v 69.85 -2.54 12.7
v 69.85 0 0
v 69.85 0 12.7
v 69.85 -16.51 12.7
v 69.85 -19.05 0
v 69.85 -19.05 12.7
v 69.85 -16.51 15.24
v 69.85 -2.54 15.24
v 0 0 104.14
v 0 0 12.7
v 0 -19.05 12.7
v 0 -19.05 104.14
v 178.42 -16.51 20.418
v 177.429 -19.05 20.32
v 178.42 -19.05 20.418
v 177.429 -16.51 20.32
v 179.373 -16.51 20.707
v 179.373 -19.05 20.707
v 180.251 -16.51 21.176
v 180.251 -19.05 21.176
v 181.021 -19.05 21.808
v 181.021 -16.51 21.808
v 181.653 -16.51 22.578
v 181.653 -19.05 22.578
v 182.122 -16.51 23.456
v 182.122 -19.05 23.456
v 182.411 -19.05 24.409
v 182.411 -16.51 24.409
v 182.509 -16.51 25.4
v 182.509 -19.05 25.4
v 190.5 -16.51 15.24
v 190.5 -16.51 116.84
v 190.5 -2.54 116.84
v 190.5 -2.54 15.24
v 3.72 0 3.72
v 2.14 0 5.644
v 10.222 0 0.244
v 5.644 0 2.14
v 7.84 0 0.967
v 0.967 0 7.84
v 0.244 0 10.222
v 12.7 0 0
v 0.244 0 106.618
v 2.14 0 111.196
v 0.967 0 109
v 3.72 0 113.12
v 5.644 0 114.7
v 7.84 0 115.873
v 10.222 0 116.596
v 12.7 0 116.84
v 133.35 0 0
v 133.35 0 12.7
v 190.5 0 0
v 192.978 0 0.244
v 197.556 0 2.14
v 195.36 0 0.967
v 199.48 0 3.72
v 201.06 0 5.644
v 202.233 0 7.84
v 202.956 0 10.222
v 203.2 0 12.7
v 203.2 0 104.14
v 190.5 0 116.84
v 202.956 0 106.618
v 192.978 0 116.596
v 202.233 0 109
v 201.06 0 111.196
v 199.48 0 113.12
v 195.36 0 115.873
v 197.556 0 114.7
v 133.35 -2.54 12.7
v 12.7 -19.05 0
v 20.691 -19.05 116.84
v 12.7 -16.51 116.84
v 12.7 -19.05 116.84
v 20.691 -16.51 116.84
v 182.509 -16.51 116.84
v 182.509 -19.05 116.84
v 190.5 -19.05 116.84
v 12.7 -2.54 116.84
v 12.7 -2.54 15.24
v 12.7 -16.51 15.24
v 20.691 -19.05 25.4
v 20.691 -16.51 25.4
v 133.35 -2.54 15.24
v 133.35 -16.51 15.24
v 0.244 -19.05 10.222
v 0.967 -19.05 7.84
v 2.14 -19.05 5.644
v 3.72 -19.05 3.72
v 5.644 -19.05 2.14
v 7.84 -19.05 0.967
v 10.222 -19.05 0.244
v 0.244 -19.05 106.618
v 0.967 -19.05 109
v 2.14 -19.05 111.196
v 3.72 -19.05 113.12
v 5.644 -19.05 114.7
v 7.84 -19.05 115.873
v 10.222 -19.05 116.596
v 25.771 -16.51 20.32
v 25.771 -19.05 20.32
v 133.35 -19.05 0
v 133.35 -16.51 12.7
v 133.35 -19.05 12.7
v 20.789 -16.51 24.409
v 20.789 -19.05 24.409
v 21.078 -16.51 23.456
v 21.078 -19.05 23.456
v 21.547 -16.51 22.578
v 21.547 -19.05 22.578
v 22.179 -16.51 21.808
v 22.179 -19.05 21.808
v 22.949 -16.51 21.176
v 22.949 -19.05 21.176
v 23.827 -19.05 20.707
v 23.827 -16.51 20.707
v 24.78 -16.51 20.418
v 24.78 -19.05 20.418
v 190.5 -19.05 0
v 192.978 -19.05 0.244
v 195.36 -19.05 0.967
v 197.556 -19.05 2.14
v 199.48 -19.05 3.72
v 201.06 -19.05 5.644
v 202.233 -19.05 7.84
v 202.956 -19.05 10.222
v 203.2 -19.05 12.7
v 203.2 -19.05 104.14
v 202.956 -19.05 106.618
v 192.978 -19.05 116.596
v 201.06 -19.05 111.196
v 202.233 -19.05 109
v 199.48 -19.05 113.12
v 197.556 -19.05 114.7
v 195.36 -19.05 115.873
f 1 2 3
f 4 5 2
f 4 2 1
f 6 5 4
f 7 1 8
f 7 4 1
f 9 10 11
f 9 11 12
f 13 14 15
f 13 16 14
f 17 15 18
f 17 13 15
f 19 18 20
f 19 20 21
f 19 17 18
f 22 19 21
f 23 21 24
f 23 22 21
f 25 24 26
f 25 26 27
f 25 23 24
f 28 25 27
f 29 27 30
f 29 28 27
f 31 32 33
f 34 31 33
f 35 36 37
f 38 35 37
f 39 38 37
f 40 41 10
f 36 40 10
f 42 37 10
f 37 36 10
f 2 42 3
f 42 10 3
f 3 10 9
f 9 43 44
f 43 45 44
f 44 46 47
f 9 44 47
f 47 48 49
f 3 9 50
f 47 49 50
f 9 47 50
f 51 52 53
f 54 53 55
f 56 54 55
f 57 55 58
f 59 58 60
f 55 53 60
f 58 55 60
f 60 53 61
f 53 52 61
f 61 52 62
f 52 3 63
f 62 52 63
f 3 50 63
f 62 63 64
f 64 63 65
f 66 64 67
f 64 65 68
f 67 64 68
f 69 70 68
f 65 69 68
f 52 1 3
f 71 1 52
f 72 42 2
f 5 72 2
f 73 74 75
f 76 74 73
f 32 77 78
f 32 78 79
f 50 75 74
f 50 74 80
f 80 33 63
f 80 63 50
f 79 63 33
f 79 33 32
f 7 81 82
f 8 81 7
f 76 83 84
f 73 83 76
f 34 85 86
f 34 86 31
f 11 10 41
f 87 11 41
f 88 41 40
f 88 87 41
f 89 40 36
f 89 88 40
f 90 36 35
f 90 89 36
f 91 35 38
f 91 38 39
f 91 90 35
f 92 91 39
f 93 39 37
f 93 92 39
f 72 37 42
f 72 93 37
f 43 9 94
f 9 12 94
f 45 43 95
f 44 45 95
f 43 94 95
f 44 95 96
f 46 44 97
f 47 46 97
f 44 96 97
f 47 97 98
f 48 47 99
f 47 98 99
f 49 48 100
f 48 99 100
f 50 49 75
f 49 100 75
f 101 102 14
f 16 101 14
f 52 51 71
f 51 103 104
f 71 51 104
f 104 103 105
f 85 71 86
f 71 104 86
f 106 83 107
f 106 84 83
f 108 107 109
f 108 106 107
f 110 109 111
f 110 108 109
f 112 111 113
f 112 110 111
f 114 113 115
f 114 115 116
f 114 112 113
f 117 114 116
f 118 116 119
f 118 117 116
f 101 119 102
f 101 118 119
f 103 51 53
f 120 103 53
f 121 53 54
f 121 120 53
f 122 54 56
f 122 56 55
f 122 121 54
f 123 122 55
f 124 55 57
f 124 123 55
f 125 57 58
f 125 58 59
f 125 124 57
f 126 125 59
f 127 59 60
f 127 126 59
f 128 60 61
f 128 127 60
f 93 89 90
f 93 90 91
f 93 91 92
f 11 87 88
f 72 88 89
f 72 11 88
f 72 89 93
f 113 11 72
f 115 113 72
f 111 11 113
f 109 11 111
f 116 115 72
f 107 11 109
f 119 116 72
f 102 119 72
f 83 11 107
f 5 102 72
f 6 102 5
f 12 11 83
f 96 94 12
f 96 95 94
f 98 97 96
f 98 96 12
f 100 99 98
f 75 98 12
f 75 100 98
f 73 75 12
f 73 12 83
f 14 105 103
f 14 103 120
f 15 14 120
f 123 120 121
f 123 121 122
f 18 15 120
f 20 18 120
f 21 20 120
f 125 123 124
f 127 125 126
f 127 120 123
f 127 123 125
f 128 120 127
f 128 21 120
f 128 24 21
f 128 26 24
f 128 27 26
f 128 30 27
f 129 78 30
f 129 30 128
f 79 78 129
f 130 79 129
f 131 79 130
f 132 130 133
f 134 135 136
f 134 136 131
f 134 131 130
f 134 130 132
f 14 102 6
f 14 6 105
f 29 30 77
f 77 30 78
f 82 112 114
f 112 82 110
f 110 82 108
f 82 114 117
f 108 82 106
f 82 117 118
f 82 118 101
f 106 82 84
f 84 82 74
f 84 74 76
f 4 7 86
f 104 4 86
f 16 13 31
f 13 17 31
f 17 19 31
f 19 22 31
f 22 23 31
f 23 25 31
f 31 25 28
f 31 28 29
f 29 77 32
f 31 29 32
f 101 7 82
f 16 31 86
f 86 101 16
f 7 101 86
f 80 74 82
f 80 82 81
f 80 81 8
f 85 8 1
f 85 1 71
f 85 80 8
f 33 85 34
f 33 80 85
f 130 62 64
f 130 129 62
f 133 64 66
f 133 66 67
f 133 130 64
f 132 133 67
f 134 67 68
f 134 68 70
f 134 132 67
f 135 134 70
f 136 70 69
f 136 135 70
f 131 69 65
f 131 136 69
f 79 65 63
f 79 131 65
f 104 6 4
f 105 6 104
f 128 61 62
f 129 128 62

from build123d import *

# Parameters (mm, degrees)
F0_W     = 203.2
F0_H     = 116.84
F1_DEPTH = 19.05
F2_W     = 177.8
F2_H     = 13.97
F3_DEPTH = 101.6
F4_W     = 161.8175851255
F4_H     = 96.52
F5_DEPTH = 2.54
F6_W     = 63.5
F6_H     = 13.97
F7_DEPTH = 15.241
F8_W     = 63.5
F8_H     = 12.7
F9_DEPTH = 19.051
F10_R    = 12.69999
F11_R    = 5.08


# Not quite as in the source:
# - a fillet or chamfer is up to 0.001 mm smaller than in the source, because OpenCascade refuses the exact size


with BuildPart() as f1:
    # F0 (on Front) → F1 (new body)
    with BuildSketch(Plane.XZ):
        with Locations((101.6, 58.42)):
            Rectangle(F0_W, F0_H)
    extrude(amount=F1_DEPTH)

    # F2 (on face) → F3 (cut)
    with BuildSketch(Plane.XY.offset(116.84)):
        with Locations((101.6, -9.525)):
            Rectangle(F2_W, F2_H)
    extrude(amount=-F3_DEPTH, mode=Mode.SUBTRACT)

    # F4 (on face) → F5 (cut, through all)
    with BuildSketch(Plane.XZ.offset(19.05)):
        with Locations((101.6, 68.58)):
            Rectangle(F4_W, F4_H)
    extrude(amount=-F5_DEPTH, mode=Mode.SUBTRACT)

    # F6 (on face) → F7 (cut, through all)
    with BuildSketch(Plane.XY.offset(15.24)):
        with Locations((101.6, -9.525)):
            Rectangle(F6_W, F6_H)
    extrude(amount=-F7_DEPTH, mode=Mode.SUBTRACT)

    # F8 (on face) → F9 (cut, through all)
    with BuildSketch(Plane.XZ.offset(19.05)):
        with Locations((101.6, 6.35)):
            Rectangle(F8_W, F8_H)
    extrude(amount=-F9_DEPTH, mode=Mode.SUBTRACT)

    # F10 (radius 12.7 in the source; OpenCascade refuses exactly that, so slightly less here)
    f10_edges = [f1.edges().sort_by_distance(p)[0] for p in [
        (0, -9.525, 116.84),
        (0, -9.525, 0),
        (203.2, -9.525, 0),
        (203.2, -9.525, 116.84),
    ]]
    fillet(f10_edges, radius=F10_R)

    # F11
    f11_edges = [f1.edges().sort_by_distance(p)[0] for p in [
        (20.691207, -17.78, 20.32),
        (182.508793, -17.78, 20.32),
    ]]
    fillet(f11_edges, radius=F11_R)


solid = f1.part
